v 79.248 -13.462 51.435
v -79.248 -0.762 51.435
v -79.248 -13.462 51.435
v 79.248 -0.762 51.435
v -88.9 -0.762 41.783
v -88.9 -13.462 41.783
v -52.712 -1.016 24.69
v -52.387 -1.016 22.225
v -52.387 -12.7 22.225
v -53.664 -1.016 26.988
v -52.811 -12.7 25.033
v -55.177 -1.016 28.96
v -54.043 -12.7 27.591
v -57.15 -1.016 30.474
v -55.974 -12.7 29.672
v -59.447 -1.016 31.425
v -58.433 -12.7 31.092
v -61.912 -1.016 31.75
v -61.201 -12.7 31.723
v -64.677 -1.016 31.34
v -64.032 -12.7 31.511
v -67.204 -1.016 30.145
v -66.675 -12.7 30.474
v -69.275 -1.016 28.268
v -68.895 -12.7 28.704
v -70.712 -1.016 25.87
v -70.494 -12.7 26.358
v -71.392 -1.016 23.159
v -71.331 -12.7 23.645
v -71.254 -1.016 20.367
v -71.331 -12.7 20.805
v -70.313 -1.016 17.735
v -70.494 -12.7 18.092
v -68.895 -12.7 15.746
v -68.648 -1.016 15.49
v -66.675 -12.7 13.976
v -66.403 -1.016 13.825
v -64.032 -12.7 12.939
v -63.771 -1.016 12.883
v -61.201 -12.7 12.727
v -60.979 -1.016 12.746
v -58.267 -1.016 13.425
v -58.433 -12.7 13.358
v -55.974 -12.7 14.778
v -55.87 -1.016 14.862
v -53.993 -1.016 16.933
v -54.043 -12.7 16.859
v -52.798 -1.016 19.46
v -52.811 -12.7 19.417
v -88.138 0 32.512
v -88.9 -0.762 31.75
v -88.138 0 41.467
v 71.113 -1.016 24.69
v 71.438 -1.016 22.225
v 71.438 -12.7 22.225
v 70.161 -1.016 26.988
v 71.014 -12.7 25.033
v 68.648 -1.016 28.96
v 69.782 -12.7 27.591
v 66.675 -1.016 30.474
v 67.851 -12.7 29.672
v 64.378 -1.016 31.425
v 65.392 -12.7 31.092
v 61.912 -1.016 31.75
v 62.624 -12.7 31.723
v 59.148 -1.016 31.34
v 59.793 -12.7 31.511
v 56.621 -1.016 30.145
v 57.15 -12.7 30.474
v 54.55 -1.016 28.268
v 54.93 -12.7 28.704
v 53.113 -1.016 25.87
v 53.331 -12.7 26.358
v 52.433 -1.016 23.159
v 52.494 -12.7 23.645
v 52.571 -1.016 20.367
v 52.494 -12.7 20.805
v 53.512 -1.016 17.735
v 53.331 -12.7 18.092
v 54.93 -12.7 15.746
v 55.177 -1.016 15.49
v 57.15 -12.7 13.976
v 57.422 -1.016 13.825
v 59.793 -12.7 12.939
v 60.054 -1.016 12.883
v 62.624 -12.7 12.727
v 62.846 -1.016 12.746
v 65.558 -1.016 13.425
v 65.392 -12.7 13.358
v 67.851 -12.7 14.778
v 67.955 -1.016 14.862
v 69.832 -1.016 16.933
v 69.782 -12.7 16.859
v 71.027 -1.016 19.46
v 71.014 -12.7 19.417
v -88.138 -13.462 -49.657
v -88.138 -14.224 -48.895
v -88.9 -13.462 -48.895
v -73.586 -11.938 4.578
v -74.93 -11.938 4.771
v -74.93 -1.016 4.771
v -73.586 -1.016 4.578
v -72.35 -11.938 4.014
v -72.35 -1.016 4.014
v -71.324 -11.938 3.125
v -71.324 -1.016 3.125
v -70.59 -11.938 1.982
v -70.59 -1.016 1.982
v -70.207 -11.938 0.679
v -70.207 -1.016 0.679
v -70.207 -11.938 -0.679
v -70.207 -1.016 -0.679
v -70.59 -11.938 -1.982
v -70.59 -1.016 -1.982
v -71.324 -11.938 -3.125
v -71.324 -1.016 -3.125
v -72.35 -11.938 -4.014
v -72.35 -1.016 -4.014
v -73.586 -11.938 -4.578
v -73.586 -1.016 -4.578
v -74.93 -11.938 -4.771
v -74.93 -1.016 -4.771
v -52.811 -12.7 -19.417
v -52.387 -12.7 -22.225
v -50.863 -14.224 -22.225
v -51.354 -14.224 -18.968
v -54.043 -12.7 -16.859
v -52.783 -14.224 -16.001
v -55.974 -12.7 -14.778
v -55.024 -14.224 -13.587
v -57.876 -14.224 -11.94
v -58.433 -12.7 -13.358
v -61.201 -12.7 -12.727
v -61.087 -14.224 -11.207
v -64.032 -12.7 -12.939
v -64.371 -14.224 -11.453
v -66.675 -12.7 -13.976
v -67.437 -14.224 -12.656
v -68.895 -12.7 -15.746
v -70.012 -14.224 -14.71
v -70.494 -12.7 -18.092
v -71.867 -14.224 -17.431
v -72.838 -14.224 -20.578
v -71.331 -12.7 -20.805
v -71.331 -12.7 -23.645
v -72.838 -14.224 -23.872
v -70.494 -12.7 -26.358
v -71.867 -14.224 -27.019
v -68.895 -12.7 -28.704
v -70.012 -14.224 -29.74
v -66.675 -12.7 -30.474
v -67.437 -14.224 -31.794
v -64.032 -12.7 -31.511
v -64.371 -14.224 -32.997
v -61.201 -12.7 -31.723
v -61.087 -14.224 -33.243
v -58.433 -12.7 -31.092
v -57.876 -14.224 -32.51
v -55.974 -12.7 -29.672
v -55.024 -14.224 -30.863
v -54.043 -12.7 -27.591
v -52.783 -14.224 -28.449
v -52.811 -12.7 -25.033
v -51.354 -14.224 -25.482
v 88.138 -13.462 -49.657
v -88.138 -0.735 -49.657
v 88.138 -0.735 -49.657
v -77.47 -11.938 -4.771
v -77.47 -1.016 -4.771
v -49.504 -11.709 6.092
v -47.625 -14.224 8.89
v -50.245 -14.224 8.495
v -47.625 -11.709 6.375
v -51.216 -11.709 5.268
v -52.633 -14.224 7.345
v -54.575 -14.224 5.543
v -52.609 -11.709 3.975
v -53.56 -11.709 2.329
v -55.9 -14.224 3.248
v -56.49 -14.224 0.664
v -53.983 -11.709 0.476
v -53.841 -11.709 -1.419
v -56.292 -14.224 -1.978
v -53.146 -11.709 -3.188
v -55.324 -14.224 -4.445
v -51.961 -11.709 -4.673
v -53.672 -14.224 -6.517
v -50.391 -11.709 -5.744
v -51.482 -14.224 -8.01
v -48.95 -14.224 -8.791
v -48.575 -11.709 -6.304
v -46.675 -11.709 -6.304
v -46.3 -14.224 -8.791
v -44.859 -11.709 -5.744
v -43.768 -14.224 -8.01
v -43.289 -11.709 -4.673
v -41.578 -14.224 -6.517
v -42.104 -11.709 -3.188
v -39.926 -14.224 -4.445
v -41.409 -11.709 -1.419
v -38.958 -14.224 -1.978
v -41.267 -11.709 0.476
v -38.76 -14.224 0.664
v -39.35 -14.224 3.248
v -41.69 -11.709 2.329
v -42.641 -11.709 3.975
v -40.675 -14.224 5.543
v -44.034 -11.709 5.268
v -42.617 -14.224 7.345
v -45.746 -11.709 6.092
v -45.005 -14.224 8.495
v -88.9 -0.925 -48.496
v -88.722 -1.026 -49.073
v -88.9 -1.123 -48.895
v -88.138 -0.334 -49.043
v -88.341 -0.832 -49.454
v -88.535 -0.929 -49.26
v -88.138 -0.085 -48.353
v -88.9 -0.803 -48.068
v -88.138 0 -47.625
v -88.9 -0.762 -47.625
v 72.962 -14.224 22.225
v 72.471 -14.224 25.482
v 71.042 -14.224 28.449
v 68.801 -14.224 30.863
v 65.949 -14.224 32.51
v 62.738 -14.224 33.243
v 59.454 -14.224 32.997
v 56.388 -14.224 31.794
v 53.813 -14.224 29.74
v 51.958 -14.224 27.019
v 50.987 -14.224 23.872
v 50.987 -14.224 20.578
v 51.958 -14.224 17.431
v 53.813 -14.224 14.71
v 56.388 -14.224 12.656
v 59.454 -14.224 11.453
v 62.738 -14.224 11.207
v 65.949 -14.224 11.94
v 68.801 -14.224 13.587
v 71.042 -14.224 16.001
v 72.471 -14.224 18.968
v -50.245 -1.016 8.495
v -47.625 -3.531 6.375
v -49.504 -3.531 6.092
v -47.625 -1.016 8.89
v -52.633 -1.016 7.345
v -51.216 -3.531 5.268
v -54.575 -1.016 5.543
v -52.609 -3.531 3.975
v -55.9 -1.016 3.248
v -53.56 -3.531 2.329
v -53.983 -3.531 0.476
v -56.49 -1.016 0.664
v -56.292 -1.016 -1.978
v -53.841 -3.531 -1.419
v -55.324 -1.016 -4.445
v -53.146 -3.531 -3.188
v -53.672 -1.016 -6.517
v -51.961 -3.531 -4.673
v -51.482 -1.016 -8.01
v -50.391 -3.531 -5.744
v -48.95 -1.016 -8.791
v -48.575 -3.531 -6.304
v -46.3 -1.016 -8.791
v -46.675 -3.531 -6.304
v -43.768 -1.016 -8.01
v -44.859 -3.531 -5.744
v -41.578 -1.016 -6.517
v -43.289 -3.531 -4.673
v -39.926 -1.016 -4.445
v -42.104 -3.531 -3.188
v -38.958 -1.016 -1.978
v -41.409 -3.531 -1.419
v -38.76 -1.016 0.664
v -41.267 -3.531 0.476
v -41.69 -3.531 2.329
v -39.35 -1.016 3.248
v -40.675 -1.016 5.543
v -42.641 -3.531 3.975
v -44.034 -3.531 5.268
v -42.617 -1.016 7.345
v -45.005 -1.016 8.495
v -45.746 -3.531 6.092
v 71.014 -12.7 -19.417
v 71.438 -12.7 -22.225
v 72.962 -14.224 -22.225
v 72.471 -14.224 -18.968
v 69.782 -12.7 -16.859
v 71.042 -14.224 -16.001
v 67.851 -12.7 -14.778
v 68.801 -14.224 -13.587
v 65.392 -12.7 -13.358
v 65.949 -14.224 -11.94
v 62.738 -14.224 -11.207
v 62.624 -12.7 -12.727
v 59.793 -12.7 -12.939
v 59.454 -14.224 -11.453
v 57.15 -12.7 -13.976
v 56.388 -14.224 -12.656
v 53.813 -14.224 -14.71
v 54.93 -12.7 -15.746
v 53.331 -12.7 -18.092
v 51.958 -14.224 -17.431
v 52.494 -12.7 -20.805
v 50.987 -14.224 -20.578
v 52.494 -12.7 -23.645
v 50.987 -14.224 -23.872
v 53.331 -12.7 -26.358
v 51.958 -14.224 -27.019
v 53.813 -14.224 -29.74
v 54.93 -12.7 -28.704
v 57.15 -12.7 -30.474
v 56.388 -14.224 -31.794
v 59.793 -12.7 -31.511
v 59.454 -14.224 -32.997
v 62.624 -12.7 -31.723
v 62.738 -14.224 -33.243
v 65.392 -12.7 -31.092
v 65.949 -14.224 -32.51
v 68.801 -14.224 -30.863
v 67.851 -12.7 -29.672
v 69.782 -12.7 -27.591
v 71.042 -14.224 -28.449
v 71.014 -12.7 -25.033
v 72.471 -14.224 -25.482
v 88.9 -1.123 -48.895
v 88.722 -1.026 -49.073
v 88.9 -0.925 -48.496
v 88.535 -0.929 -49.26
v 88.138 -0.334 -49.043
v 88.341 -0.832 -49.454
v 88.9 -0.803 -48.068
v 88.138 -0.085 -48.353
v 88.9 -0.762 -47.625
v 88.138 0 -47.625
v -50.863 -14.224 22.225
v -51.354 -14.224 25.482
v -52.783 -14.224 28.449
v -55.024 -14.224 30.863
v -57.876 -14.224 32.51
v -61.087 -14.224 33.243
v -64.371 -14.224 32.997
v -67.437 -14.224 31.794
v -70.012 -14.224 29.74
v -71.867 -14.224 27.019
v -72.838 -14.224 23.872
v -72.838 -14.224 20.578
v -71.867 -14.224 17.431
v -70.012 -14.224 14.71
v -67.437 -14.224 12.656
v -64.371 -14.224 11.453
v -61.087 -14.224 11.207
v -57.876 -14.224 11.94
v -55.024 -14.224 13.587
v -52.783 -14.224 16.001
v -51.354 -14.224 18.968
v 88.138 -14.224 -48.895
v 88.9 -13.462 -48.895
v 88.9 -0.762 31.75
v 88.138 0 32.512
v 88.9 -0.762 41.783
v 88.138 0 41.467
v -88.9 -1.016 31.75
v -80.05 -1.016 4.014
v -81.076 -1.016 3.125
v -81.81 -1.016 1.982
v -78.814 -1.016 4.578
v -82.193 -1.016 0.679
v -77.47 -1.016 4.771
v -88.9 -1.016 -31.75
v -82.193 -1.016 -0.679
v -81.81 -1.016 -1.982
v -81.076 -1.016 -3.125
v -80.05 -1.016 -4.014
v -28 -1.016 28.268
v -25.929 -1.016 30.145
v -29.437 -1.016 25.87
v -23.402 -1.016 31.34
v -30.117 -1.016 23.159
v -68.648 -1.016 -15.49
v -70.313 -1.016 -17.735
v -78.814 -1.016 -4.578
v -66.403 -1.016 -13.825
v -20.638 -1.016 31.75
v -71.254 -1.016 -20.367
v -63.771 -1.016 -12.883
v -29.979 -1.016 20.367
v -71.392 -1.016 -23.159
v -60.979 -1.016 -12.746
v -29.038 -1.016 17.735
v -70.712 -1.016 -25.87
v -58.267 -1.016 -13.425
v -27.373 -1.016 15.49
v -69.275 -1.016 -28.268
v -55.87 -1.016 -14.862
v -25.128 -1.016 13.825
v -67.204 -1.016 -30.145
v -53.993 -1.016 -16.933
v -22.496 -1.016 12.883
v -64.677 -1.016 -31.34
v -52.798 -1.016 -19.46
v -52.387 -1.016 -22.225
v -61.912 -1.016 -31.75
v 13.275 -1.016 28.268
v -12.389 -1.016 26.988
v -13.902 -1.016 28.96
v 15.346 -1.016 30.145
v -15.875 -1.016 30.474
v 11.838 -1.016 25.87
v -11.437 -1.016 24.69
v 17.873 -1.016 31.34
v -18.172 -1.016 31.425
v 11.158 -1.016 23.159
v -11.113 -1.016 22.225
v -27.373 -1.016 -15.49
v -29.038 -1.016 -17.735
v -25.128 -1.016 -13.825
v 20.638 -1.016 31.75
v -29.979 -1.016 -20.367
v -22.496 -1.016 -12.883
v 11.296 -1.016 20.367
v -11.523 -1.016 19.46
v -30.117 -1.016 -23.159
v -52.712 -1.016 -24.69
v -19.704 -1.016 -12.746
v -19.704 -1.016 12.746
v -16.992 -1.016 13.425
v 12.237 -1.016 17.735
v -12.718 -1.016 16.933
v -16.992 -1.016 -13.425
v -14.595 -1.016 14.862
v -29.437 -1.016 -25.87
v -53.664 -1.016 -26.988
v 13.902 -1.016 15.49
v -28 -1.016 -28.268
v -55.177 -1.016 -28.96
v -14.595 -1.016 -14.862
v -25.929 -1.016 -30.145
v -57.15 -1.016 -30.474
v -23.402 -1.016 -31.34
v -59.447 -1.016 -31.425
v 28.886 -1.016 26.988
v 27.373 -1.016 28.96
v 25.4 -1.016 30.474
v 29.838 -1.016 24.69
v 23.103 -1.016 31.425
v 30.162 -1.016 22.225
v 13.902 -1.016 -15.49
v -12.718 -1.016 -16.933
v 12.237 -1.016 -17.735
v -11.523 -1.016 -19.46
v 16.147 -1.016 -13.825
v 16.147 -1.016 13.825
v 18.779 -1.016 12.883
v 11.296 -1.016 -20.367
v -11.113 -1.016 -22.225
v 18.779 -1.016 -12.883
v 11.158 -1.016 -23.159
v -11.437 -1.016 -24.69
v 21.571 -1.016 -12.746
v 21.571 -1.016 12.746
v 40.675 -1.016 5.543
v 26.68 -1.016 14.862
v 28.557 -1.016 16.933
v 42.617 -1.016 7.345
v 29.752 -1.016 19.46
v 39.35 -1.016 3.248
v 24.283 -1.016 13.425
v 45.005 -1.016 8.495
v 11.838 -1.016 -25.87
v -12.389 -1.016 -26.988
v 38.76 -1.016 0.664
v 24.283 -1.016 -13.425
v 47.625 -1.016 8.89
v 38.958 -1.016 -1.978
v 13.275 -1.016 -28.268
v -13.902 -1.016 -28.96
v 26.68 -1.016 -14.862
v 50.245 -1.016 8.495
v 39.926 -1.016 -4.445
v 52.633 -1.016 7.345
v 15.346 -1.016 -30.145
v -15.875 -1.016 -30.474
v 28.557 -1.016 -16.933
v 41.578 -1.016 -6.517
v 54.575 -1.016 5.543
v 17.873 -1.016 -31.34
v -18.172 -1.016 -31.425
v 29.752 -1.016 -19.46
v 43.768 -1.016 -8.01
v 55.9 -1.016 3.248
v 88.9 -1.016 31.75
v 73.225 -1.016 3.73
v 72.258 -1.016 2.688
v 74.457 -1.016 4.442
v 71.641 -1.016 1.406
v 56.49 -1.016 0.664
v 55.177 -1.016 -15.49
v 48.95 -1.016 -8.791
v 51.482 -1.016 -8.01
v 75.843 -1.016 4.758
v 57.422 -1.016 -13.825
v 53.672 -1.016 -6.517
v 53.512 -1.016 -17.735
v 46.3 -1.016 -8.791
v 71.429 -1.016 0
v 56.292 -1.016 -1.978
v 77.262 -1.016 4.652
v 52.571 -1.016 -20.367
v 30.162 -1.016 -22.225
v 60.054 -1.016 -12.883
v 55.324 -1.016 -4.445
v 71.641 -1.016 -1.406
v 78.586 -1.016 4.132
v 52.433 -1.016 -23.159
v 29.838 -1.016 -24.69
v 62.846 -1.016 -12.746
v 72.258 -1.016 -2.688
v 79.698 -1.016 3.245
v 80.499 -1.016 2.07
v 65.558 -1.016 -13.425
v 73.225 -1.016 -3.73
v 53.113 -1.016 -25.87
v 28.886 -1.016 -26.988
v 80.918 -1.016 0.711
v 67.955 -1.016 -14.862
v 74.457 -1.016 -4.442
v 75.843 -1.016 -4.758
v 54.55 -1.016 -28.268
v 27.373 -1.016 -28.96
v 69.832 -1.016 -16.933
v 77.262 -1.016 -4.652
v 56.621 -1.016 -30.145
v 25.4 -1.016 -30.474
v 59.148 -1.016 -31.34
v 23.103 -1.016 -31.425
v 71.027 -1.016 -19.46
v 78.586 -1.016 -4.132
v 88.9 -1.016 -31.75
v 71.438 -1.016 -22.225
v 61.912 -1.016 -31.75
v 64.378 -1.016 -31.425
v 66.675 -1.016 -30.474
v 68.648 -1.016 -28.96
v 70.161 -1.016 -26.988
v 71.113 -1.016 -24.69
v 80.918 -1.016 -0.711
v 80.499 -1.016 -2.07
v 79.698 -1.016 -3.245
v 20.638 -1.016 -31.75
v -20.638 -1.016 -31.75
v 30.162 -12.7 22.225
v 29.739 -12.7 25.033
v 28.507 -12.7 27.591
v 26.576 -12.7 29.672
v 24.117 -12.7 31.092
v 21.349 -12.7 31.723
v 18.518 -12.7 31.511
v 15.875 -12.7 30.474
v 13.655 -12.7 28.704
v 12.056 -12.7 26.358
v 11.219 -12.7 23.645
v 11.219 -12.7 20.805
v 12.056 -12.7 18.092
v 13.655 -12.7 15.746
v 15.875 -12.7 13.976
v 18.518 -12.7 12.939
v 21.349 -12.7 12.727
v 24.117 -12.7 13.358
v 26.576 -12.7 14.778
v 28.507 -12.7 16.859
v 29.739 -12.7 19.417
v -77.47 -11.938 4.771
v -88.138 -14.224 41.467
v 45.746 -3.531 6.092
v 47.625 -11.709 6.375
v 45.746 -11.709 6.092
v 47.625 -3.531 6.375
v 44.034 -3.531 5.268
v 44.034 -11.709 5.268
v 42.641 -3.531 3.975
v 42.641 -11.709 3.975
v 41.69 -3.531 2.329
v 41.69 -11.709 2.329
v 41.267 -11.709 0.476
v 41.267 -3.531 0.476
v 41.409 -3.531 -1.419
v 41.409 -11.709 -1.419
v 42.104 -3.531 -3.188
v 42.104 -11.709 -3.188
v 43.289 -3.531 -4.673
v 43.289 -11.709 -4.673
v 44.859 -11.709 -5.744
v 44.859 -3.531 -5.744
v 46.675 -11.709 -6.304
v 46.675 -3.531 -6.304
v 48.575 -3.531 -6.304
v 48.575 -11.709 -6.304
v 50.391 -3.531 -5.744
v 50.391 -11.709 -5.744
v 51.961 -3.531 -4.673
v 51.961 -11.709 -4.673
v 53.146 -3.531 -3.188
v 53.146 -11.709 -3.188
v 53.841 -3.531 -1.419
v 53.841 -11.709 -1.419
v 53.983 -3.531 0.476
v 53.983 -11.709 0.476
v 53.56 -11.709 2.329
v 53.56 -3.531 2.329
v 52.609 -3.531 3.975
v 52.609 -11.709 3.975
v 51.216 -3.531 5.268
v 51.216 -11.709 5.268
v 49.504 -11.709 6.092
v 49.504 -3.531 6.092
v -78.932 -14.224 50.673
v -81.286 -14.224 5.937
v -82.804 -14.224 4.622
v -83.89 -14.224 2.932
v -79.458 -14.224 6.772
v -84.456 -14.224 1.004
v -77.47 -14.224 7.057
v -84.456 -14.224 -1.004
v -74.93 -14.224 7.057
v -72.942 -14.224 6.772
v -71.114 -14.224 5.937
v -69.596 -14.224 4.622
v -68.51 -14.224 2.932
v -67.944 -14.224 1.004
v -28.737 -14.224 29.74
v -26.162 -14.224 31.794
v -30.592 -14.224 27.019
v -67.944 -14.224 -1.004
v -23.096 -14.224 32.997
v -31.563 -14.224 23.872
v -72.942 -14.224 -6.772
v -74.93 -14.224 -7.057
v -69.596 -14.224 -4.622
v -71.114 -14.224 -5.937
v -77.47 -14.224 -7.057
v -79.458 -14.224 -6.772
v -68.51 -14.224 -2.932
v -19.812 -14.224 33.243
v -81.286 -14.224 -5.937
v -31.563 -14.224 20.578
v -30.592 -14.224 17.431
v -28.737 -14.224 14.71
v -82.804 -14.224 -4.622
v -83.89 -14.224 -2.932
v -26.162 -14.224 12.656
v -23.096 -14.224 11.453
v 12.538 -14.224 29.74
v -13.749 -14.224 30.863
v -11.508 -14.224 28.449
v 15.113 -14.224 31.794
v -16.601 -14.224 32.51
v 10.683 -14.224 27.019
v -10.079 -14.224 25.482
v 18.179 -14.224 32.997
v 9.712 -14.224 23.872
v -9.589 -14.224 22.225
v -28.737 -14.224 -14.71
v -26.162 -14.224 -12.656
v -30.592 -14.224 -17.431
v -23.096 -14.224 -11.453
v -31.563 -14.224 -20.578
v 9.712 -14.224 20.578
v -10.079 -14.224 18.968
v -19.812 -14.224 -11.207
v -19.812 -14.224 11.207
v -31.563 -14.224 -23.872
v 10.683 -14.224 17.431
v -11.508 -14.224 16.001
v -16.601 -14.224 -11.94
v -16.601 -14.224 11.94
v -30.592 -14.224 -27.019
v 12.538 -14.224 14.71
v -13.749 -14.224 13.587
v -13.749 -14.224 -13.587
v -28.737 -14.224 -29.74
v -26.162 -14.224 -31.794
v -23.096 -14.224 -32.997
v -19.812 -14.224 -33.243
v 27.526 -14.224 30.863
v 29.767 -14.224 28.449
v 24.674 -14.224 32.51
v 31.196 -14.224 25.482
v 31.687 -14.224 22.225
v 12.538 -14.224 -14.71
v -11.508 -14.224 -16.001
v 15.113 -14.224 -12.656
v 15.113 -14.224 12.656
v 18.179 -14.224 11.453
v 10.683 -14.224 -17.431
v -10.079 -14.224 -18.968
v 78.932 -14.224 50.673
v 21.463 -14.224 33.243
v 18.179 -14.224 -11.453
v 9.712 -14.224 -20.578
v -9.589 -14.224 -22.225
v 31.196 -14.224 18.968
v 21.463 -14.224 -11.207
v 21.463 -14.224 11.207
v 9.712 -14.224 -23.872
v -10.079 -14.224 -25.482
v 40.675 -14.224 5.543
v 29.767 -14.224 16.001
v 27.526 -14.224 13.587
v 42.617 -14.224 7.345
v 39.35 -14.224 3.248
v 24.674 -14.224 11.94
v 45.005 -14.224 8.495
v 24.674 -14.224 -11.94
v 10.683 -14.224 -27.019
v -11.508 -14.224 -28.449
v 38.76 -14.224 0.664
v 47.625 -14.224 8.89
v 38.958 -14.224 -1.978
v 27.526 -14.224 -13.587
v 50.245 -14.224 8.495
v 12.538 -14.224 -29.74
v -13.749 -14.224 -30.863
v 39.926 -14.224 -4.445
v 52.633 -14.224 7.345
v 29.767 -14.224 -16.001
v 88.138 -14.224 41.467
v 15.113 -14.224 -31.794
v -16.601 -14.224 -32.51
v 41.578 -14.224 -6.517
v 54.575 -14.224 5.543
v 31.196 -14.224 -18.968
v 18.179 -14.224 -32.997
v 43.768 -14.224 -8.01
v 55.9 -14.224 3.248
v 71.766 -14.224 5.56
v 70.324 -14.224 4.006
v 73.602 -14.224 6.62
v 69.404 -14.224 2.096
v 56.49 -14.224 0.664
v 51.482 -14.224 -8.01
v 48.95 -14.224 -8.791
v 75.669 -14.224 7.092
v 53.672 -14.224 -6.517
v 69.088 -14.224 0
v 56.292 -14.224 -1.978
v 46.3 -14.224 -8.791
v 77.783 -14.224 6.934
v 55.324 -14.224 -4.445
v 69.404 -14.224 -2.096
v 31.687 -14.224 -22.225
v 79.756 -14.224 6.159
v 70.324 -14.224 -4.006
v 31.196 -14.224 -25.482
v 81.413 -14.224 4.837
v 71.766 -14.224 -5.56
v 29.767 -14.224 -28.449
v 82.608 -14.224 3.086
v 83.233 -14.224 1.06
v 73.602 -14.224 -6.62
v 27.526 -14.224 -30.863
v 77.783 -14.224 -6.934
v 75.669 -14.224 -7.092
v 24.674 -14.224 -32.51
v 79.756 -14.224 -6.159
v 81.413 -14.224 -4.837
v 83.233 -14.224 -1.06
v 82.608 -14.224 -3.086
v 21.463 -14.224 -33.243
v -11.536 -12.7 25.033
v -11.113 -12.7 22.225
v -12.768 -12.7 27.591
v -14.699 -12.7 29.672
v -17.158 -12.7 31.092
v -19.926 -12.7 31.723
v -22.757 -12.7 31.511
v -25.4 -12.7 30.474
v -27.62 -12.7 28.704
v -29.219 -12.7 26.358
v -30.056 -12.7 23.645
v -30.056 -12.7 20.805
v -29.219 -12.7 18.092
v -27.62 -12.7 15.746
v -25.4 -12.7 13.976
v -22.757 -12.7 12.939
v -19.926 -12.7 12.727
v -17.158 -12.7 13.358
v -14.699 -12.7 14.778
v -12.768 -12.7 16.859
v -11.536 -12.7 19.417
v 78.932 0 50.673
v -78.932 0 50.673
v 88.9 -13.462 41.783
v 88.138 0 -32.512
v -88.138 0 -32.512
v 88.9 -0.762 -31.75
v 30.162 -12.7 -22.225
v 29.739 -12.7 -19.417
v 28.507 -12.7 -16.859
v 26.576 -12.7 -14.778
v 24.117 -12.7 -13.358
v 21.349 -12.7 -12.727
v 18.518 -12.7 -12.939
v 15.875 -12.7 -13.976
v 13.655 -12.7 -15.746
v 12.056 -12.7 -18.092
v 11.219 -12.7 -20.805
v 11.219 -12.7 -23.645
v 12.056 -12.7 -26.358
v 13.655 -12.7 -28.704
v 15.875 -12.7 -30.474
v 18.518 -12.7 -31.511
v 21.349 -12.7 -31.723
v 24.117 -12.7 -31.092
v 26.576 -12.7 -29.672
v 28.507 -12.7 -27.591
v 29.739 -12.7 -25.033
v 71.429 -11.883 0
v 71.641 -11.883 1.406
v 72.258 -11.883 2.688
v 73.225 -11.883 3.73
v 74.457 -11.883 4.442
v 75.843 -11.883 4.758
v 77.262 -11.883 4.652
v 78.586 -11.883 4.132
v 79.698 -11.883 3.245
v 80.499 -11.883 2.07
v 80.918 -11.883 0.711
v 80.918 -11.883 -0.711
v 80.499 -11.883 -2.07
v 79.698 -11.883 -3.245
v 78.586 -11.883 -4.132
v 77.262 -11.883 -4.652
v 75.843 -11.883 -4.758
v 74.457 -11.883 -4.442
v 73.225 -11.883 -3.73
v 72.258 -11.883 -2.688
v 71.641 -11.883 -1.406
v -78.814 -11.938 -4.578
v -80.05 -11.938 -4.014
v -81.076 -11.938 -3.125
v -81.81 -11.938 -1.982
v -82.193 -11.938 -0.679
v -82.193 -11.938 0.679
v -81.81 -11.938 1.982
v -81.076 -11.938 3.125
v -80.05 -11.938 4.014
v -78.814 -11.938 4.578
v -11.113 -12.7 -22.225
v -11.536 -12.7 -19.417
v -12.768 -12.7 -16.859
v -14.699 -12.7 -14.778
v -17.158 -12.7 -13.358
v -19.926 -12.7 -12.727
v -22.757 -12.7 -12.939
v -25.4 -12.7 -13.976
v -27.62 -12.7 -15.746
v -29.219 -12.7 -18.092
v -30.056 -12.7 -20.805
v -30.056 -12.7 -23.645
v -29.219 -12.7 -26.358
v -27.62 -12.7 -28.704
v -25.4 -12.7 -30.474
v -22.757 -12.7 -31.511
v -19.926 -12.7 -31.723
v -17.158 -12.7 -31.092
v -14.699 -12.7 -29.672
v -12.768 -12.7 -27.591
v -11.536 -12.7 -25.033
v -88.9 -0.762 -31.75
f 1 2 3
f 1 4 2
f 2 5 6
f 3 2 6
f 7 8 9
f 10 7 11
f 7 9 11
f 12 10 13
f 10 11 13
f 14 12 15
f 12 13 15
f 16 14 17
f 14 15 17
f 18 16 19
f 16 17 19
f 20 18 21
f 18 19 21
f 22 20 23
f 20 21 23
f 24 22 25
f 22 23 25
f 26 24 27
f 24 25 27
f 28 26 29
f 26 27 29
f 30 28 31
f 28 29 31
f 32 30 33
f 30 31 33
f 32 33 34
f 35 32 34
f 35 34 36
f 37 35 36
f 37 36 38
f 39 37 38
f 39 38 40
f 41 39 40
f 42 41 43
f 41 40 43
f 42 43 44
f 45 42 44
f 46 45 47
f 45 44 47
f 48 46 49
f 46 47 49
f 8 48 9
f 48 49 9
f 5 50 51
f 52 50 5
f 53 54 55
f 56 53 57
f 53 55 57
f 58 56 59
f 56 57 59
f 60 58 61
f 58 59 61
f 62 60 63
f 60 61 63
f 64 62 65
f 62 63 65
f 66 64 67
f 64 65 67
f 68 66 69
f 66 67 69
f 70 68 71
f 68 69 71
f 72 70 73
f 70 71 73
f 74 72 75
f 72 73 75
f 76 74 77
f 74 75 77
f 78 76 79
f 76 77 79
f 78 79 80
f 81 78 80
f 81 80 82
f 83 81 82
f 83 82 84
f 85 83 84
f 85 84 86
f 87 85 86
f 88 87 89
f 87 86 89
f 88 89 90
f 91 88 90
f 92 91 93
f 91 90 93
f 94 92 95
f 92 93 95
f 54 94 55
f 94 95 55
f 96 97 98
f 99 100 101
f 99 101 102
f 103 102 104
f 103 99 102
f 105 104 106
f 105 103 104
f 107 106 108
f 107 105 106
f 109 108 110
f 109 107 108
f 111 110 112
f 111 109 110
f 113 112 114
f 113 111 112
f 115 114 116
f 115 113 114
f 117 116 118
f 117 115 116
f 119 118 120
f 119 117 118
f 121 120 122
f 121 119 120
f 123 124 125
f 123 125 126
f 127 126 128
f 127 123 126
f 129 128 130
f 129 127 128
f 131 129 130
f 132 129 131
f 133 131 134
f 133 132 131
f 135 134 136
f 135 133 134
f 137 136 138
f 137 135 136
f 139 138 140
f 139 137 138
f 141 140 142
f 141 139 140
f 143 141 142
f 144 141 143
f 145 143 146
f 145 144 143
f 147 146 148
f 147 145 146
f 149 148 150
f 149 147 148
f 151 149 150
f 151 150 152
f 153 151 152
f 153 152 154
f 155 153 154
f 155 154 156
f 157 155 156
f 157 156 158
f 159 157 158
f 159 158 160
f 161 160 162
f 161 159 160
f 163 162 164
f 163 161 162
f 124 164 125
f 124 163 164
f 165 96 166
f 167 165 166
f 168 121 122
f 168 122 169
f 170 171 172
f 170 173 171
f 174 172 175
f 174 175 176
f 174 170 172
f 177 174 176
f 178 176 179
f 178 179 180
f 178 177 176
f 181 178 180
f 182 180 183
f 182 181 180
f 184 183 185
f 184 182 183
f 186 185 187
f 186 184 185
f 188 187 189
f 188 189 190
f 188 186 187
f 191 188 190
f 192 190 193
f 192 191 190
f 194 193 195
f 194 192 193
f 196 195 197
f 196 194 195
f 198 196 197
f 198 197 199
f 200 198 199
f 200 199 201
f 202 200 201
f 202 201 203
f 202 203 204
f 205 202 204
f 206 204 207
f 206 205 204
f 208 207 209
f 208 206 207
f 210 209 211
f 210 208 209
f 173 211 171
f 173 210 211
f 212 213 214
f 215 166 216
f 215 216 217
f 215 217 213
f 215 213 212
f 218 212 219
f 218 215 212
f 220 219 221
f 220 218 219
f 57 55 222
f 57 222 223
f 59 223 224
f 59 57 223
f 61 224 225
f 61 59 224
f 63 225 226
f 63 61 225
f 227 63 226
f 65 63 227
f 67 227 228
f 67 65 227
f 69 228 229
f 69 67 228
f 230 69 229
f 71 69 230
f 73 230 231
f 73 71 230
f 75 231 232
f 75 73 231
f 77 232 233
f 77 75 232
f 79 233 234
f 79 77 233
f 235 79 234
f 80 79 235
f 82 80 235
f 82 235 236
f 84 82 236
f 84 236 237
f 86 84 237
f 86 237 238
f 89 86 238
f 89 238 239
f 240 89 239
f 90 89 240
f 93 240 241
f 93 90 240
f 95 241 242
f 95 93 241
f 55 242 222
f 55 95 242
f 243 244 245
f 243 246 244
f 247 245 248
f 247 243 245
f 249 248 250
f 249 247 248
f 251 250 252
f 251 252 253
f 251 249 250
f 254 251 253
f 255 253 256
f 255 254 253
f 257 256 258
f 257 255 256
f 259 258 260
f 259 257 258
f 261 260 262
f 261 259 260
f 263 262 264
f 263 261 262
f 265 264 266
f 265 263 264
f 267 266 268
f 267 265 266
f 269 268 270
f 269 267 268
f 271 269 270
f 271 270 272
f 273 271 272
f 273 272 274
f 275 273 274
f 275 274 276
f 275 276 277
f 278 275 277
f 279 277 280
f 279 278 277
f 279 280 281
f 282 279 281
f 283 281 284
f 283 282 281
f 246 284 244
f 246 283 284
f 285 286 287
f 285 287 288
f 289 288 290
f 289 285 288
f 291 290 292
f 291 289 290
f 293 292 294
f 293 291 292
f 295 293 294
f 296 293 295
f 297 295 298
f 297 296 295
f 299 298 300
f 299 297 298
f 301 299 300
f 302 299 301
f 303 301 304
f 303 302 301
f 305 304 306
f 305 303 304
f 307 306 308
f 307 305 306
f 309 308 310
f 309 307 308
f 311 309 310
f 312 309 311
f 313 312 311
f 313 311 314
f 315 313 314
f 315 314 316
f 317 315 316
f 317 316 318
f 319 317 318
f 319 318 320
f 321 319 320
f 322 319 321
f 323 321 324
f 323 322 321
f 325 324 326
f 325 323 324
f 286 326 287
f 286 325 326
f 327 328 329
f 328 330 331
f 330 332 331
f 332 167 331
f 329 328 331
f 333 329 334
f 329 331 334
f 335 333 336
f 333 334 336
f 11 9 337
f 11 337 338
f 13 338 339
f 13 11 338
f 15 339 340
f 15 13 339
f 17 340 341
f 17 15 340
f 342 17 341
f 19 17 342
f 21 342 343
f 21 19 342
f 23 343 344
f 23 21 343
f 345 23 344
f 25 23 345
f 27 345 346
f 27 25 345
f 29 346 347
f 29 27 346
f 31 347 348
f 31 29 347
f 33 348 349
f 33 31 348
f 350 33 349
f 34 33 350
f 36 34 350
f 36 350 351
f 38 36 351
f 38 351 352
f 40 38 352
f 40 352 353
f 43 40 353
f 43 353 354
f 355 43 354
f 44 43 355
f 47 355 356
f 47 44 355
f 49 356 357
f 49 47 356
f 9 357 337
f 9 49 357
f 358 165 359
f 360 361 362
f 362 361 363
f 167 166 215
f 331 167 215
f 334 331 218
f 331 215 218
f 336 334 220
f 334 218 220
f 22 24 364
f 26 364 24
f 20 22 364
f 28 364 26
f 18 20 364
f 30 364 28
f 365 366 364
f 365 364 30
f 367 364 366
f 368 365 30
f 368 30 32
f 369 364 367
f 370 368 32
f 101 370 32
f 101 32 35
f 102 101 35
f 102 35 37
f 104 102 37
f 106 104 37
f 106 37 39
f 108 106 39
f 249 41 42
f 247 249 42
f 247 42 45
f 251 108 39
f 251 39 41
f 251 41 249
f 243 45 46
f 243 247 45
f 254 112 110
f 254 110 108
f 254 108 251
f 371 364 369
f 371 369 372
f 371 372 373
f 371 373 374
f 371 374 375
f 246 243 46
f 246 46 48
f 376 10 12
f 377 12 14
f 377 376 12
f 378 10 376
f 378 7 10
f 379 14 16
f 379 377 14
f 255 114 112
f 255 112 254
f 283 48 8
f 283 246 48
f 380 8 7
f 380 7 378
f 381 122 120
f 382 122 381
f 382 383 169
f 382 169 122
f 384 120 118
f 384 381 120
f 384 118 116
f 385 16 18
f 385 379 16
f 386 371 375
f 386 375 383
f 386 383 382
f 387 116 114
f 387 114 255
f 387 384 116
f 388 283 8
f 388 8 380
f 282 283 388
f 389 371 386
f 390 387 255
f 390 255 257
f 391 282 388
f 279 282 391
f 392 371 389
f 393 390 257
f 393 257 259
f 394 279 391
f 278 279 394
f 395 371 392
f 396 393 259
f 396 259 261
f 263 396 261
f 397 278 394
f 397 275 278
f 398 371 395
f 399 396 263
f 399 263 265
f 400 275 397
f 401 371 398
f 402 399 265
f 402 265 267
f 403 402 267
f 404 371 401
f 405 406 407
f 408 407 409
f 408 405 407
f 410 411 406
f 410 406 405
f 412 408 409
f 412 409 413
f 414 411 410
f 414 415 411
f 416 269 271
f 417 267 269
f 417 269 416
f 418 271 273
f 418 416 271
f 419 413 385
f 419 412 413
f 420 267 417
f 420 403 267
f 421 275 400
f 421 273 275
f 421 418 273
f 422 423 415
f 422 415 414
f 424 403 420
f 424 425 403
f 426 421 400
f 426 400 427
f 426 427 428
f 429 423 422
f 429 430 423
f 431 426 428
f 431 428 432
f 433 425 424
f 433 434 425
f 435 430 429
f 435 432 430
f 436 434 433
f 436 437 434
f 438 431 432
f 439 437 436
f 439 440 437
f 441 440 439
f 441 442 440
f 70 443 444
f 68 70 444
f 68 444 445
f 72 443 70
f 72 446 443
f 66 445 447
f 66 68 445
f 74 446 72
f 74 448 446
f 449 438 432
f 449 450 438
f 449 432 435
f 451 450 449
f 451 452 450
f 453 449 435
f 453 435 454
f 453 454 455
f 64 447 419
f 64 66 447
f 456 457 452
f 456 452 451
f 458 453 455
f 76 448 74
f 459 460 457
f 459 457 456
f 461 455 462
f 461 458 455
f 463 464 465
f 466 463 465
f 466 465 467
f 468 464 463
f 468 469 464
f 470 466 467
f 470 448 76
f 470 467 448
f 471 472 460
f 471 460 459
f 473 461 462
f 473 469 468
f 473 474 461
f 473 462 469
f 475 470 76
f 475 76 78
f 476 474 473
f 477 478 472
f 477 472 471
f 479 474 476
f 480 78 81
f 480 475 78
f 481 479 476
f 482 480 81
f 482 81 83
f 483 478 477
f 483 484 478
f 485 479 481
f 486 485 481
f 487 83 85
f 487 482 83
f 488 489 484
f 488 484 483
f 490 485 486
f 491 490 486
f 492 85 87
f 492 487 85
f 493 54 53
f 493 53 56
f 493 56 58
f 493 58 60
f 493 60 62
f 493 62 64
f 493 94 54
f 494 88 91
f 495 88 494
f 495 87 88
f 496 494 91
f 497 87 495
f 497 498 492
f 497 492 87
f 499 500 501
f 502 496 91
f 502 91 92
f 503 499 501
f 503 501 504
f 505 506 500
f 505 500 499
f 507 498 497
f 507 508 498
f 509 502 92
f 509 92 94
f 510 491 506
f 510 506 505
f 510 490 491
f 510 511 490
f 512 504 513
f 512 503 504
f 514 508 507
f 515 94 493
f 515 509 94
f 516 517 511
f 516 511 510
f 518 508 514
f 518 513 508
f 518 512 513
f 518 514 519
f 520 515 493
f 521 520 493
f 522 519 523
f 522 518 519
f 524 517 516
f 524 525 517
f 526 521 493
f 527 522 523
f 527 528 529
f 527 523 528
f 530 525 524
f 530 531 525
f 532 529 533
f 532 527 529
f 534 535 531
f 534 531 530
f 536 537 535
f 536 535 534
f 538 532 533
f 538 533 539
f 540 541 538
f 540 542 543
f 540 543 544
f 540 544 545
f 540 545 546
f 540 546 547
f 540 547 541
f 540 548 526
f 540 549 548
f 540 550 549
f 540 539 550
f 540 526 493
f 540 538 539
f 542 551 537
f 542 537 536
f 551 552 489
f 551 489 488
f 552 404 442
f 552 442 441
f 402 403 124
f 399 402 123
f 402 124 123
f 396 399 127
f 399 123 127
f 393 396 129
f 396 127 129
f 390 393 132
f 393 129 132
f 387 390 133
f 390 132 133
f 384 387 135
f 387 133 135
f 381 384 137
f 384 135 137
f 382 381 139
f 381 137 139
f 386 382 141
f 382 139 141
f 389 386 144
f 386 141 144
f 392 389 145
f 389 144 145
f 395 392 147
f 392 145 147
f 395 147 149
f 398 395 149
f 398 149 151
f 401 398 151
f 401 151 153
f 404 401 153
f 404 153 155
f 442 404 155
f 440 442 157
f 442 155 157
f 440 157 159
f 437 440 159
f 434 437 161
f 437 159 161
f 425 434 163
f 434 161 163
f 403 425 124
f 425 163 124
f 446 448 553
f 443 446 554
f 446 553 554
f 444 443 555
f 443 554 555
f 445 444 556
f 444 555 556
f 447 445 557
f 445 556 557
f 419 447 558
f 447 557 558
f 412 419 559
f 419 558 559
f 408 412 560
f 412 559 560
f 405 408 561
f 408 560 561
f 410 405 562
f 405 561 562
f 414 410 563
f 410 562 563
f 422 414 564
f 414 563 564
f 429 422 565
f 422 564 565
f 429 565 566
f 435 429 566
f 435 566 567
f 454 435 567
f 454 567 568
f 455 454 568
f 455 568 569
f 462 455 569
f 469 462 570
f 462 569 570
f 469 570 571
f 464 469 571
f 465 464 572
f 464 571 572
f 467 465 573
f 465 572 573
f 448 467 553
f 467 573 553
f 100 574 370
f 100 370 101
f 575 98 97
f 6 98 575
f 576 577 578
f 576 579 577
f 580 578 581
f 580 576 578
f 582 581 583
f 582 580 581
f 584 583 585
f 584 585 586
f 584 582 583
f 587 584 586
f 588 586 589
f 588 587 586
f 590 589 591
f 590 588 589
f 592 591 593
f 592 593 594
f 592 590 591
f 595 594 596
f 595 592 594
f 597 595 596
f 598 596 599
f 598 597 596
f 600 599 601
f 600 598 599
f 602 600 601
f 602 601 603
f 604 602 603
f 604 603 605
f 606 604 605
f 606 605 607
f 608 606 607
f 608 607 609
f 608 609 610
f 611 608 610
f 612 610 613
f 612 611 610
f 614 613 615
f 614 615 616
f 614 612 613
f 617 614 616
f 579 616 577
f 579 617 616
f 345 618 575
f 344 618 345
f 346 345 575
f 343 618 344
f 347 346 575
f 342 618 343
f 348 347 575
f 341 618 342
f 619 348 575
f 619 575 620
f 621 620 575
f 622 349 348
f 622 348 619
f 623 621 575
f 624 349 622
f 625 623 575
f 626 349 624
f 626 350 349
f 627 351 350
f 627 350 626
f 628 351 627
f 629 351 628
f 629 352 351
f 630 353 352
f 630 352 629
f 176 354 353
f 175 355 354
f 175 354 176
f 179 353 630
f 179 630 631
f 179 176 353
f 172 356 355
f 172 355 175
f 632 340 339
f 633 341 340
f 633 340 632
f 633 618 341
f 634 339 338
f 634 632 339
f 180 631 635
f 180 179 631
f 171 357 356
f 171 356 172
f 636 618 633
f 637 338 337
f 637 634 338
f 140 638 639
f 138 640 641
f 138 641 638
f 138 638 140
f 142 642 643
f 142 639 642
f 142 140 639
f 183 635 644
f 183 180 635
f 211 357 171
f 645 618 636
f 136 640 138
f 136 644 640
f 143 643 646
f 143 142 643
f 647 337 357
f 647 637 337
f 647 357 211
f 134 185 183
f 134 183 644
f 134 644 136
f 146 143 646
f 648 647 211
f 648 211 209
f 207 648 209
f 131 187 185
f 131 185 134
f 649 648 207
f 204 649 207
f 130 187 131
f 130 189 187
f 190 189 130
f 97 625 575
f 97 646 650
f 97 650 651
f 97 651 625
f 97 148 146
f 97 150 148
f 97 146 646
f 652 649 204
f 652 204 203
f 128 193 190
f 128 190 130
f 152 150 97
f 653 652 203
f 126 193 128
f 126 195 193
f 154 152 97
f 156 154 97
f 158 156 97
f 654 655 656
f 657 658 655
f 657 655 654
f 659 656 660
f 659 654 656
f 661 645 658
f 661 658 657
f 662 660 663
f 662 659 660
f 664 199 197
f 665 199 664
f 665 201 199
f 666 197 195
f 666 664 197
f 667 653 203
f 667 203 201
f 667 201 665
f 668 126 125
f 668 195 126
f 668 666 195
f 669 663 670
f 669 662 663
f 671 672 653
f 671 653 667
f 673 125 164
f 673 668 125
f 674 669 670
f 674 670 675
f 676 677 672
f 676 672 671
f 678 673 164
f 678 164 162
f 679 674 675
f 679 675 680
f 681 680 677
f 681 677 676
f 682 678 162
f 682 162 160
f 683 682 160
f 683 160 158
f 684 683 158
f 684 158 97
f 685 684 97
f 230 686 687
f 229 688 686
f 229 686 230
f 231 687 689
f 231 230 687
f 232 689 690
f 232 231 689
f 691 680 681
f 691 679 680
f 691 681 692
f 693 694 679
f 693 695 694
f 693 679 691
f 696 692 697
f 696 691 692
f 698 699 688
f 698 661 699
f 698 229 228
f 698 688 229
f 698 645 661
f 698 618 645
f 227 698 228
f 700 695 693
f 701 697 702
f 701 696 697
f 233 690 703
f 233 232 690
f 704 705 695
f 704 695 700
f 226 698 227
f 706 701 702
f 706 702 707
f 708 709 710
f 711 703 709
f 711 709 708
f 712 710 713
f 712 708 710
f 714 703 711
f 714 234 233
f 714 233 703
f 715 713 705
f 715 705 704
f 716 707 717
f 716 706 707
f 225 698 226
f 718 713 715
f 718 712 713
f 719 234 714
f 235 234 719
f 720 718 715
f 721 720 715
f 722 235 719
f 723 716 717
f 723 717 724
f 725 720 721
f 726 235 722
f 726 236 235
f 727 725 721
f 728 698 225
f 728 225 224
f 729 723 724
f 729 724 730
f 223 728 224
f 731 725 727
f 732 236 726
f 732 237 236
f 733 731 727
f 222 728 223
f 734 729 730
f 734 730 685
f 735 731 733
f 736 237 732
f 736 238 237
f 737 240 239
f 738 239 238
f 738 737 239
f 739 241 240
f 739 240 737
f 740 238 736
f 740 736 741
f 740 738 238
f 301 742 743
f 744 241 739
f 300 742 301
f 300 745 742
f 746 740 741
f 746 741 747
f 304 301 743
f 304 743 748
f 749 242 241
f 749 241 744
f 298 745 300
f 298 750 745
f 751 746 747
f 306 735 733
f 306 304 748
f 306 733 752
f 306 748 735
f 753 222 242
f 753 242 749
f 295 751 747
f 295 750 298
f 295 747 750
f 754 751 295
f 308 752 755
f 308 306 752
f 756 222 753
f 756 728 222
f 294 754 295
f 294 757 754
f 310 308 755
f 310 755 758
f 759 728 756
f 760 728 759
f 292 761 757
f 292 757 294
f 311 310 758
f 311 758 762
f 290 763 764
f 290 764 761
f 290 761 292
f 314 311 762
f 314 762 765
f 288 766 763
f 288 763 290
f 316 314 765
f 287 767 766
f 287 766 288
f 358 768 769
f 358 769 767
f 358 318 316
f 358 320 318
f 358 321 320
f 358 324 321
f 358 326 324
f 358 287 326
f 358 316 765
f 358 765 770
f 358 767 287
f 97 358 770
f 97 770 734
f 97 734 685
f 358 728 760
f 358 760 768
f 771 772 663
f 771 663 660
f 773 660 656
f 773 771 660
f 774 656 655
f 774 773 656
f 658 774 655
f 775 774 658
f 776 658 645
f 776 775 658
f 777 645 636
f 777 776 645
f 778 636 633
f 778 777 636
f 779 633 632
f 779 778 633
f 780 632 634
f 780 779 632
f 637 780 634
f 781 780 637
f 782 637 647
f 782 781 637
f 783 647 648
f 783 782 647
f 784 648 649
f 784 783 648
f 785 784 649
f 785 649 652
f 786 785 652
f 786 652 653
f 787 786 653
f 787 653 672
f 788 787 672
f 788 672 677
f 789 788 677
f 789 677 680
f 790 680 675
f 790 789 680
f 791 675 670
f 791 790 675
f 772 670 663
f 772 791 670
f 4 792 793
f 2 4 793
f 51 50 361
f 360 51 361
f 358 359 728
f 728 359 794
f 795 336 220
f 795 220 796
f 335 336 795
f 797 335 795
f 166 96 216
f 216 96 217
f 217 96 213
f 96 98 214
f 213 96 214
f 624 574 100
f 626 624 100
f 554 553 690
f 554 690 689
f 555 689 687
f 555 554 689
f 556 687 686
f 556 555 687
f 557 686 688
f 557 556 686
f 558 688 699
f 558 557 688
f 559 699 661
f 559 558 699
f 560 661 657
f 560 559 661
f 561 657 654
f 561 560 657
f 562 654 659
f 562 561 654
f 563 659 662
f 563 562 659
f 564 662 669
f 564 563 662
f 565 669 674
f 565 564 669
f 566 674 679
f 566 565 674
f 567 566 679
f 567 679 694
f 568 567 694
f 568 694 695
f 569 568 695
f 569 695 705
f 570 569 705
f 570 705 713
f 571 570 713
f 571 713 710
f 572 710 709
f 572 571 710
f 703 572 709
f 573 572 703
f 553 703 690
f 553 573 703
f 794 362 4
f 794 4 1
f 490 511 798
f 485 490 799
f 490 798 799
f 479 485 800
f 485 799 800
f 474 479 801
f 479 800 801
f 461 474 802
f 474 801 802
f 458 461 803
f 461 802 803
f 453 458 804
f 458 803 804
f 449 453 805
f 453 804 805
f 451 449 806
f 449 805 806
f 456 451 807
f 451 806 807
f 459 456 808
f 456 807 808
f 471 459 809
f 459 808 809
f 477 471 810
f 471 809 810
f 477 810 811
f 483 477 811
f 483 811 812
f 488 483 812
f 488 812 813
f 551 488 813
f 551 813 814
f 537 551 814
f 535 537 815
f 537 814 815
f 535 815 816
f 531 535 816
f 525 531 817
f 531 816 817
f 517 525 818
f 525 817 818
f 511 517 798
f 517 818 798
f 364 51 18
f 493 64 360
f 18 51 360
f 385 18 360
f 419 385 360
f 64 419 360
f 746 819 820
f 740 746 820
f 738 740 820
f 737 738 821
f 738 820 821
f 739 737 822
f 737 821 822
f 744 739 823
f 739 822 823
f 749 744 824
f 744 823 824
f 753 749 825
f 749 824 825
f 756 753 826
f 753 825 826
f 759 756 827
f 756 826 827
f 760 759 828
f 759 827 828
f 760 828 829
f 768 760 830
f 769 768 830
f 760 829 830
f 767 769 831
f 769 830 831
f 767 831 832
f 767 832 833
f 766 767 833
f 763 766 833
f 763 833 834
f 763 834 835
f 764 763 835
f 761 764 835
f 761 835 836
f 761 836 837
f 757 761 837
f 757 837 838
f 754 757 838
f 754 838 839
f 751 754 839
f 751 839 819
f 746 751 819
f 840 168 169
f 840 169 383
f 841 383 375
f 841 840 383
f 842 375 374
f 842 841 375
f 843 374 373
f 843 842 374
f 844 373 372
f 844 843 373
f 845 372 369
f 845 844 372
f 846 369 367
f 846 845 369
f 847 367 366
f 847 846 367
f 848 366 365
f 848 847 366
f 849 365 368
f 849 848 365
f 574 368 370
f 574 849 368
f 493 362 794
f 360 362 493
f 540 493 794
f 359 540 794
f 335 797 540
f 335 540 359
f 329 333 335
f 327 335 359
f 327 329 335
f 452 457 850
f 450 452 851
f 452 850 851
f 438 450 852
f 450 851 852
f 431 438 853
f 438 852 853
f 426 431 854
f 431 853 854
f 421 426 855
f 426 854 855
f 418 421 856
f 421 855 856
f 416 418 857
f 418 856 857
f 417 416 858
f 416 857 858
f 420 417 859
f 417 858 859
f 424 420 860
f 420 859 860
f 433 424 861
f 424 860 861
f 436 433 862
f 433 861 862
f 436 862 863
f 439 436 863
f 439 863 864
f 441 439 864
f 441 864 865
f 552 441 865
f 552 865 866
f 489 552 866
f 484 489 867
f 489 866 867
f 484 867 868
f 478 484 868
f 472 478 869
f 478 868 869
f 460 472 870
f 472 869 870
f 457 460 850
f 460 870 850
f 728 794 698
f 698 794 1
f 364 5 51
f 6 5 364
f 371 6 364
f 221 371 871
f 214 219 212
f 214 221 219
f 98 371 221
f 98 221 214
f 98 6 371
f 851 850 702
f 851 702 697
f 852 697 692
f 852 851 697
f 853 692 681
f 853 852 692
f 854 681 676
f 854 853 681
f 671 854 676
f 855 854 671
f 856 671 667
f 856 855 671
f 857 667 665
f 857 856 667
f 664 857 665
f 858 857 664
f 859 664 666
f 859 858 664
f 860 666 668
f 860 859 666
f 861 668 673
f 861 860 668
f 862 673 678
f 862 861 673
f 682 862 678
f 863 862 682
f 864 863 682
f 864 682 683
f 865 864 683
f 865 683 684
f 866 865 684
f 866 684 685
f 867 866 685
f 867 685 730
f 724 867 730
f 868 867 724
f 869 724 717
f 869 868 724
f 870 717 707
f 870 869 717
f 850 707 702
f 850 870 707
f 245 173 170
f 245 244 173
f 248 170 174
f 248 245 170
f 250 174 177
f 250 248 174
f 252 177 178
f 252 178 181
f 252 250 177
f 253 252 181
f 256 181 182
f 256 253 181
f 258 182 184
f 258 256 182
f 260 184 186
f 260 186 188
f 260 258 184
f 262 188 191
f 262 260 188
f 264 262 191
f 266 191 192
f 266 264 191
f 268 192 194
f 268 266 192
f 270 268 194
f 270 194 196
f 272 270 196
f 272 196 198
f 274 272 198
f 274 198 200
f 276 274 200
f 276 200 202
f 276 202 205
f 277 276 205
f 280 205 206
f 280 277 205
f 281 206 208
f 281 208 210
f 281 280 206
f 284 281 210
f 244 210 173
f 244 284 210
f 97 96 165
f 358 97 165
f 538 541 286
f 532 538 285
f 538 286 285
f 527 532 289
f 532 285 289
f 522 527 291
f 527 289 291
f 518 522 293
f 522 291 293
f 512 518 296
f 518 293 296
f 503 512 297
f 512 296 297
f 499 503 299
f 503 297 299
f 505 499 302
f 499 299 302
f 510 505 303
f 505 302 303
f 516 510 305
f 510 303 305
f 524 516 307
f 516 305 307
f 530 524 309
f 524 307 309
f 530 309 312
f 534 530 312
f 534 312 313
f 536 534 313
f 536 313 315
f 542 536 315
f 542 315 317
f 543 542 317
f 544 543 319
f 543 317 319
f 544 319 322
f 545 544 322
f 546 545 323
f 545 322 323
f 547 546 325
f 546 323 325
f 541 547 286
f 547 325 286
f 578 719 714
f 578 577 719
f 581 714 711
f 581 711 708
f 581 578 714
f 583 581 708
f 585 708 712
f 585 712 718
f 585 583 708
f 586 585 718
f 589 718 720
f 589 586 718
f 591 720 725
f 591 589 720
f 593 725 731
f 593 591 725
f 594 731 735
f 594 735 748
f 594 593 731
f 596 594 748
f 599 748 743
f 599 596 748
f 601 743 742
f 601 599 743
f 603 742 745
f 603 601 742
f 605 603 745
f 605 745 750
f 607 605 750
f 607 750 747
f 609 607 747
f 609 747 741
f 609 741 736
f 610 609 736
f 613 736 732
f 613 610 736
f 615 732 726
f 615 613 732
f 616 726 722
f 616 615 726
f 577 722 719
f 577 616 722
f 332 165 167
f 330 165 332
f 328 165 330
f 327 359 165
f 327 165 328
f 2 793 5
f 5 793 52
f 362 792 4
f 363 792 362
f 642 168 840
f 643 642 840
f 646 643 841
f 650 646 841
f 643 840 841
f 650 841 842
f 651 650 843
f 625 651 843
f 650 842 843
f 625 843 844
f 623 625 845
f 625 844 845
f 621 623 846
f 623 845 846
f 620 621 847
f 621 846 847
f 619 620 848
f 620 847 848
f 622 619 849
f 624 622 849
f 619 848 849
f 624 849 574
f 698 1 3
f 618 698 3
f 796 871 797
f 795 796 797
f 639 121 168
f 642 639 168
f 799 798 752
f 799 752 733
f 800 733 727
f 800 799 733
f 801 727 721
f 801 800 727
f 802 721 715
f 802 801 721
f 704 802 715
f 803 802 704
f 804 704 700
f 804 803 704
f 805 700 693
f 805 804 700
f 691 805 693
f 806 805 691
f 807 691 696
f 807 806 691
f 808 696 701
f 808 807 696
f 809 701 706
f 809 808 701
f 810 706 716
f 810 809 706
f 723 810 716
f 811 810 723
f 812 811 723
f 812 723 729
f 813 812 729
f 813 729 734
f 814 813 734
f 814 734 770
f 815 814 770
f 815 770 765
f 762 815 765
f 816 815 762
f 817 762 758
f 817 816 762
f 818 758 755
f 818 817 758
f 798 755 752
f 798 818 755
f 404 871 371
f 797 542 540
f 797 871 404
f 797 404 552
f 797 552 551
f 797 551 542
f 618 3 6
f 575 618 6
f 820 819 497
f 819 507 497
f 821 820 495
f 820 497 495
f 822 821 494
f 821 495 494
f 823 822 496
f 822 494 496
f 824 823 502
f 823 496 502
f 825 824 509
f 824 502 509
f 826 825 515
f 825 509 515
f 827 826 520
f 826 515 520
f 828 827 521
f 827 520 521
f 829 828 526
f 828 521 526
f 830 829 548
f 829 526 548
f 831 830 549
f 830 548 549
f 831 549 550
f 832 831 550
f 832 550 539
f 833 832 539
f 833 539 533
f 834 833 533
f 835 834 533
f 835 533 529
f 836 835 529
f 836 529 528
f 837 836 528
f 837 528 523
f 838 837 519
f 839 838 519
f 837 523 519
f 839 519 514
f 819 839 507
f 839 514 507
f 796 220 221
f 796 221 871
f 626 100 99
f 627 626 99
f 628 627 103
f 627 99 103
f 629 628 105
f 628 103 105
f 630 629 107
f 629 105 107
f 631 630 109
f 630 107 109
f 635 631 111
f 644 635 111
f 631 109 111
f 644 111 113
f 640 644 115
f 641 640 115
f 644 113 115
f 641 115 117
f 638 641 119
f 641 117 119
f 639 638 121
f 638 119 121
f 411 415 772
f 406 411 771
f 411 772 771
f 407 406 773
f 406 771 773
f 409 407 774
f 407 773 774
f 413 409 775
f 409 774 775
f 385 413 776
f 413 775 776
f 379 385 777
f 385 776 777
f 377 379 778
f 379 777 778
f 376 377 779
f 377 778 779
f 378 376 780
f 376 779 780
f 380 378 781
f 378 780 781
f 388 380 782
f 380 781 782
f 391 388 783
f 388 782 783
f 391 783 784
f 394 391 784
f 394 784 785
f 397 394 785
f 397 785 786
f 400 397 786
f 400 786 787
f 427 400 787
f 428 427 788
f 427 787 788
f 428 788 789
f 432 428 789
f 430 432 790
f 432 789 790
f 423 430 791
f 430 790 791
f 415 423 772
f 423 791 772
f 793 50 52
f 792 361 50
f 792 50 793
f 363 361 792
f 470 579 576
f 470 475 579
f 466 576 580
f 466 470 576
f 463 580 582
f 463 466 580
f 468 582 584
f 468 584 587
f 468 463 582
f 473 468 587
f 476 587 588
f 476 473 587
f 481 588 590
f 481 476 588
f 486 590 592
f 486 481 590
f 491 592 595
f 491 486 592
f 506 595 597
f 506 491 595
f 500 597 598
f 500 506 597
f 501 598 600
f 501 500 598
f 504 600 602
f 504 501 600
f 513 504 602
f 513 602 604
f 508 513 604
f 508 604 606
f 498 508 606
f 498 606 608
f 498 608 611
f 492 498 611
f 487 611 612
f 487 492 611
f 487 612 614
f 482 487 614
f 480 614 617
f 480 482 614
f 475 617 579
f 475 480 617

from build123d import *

# Parameters (mm, degrees)
EXTRUDE1_DEPTH                         = 88.9
EXTRUDE5_REACH                         = 90.9
EXTRUDE5_DIRECTION_2_REACH             = 90.9
F_3_4_0_75_DIAMETER_HOLE1_D            = 19.05
F_3_4_0_75_DIAMETER_HOLE1_DEPTH        = 18.5166
SKETCH6_W                              = 177.8
SKETCH6_H                              = 63.5
EXTRUDE2_DEPTH                         = 1.016
CHAMFER10_SIZE                         = 9.652
SKETCH35_W                             = 101.092
SKETCH35_H                             = 4.2926
EXTRUDE11_DEPTH                        = 89.9
EXTRUDE11_DEPTH_BACK                   = 89.9
F_3_8_0_375_DIAMETER_HOLE1_D           = 9.54278
F_3_8_0_375_DIAMETER_HOLE1_CSINK_D     = 14.224
F_3_8_0_375_DIAMETER_HOLE1_CSINK_ANGLE = 90
EXTRUDE8_DEPTH                         = 15.224
CHAMFER13_SIZE                         = 2.286
F_1_2_0_5_DIAMETER_HOLE4_AT_2_COUNT    = 2
F_1_2_0_5_DIAMETER_HOLE4_AT_2_PITCH    = 95.25
CHAMFER16_SIZE                         = 0.762
CHAMFER19_SIZE                         = 1.524


with BuildPart() as part:
    # Sketch1 → Extrude1 (new body, symmetric)
    with BuildSketch(Plane(origin=(0, 0, 0), x_dir=(0, 0, -1), z_dir=(1, 0, 0))):
        Polygon((-47.625, 0), (-51.435, 0), (-51.435, -18.5166), (-47.625, -18.5166), (47.625, -18.5166), (47.625, 0), align=None)
    extrude(amount=EXTRUDE1_DEPTH, both=True)

    # Extrude5: up to this face of the body (flat: up to its plane)
    extrude5_end = Plane(part.part.faces().sort_by_distance((-88.9, -9.2583, 1.905))[0])
    # Sketch10 → Extrude5 (add, up to the picked face)
    with BuildSketch(Plane(origin=(0, 0, 0), x_dir=(0, 0, -1), z_dir=(1, 0, 0)), mode=Mode.PRIVATE) as extrude5_sk1:
        with BuildLine():
            Line((47.625, 0), (47.625, -18.5166))
            Line((47.625, -18.5166), (49.657, -18.5166))
            Line((49.657, -18.5166), (49.657, -0.735409666))
            ThreePointArc((49.657, -0.735409666), (48.705491945, -0.189508055), (47.625, 0))
        make_face()
    extrude5_tool1 = split(extrude(extrude5_sk1.sketch, amount=-EXTRUDE5_REACH, mode=Mode.PRIVATE), bisect_by=extrude5_end, keep=Keep.BOTH, mode=Mode.PRIVATE)
    add(extrude5_tool1.solids().sort_by(Axis((0, -9.373301, -48.63438), (-1, 0, 0)))[0])

    # Extrude5 direction 2: up to this face of the body (flat: up to its plane)
    extrude5_direction_2_end = Plane(part.part.faces().sort_by_distance((88.9, -9.2583, 1.905))[0])
    # Sketch10 → Extrude5 direction 2 (add, up to the picked face)
    with BuildSketch(Plane(origin=(0, 0, 0), x_dir=(0, 0, -1), z_dir=(1, 0, 0)), mode=Mode.PRIVATE) as extrude5_direction_2_sk1:
        with BuildLine():
            Line((47.625, 0), (47.625, -18.5166))
            Line((47.625, -18.5166), (49.657, -18.5166))
            Line((49.657, -18.5166), (49.657, -0.735409666))
            ThreePointArc((49.657, -0.735409666), (48.705491945, -0.189508055), (47.625, 0))
        make_face()
    extrude5_direction_2_tool1 = split(extrude(extrude5_direction_2_sk1.sketch, amount=EXTRUDE5_DIRECTION_2_REACH, mode=Mode.PRIVATE), bisect_by=extrude5_direction_2_end, keep=Keep.BOTH, mode=Mode.PRIVATE)
    add(extrude5_direction_2_tool1.solids().sort_by(Axis((0, -9.373301, -48.63438), (1, 0, 0)))[0])

    # 3/4 (0.75) Diameter Hole1
    with Locations(Plane(origin=(100.583096031, 0, 72.51255066), x_dir=(-1, 0, 0), z_dir=(0, 1, 0))):
        with Locations((162.495596031, -94.73755066), (121.220596031, -94.73755066), (79.945596031, -94.73755066), (38.670596031, -94.73755066), (79.945596031, -50.28755066), (121.220596031, -50.28755066), (162.495596031, -50.28755066), (38.670596031, -50.28755066)):
            Hole(F_3_4_0_75_DIAMETER_HOLE1_D / 2, depth=F_3_4_0_75_DIAMETER_HOLE1_DEPTH)

    # Sketch6 → Extrude2 (cut)
    with BuildSketch(Plane(origin=(0, 0, 0), x_dir=(1, 0, 0), z_dir=(0, 1, 0))):
        Rectangle(SKETCH6_W, SKETCH6_H)
    extrude(amount=-EXTRUDE2_DEPTH, mode=Mode.SUBTRACT)

    # Chamfer10
    chamfer10_edges = [part.edges().sort_by_distance(p)[0] for p in [
        (88.9, -9.2583, 51.435),
        (-88.9, -9.2583, 51.435),
    ]]
    chamfer(chamfer10_edges, length=CHAMFER10_SIZE)

    # Sketch35 → Extrude11 (cut, two sides)
    with BuildSketch(Plane(origin=(0, 0, 0), x_dir=(0, 0, -1), z_dir=(1, 0, 0))) as extrude11_sk:
        with Locations((-0.889, -16.3703)):
            Rectangle(SKETCH35_W, SKETCH35_H)
    extrude(amount=EXTRUDE11_DEPTH, mode=Mode.SUBTRACT)
    extrude(extrude11_sk.sketch, amount=-EXTRUDE11_DEPTH_BACK, mode=Mode.SUBTRACT)

    # 3/8 (0.375) Diameter Hole1 (through all)
    with Locations(Plane(origin=(11.630068396, -14.224, 20.686230534), x_dir=(1, 0, 0), z_dir=(0, -1, 0))):
        with Locations((64.569931604, -20.686230534)):
            CounterSinkHole(F_3_8_0_375_DIAMETER_HOLE1_D / 2, F_3_8_0_375_DIAMETER_HOLE1_CSINK_D / 2, counter_sink_angle=F_3_8_0_375_DIAMETER_HOLE1_CSINK_ANGLE)

    # Sketch19 → Extrude8 (cut, through all)
    with BuildSketch(Plane.XZ.offset(14.224)):
        with BuildLine():
            Line((-77.47, 4.77139), (-74.93, 4.77139))
            ThreePointArc((-74.93, 4.77139), (-70.15861, 0), (-74.93, -4.77139))
            Line((-74.93, -4.77139), (-77.47, -4.77139))
            ThreePointArc((-77.47, -4.77139), (-82.24139, 0), (-77.47, 4.77139))
        make_face()
    extrude(amount=-EXTRUDE8_DEPTH, mode=Mode.SUBTRACT)

    # Chamfer13
    chamfer13_edges = [part.edges().sort_by_distance(p)[0] for p in [
        (-82.24139, -14.224, 0),
        (-76.2, -14.224, -4.77139),
        (-70.15861, -14.224, 0),
        (-76.2, -14.224, 4.77139),
    ]]
    chamfer(chamfer13_edges, length=CHAMFER13_SIZE)

    # Sketch26 → 1/2 (0.5) Diameter Hole4 (revolve, cut)
    with BuildSketch(Plane(origin=(-47.625, -1.016, 0), x_dir=(0, 0, 1), z_dir=(1, 0, 0))):
        Polygon((0, 0), (0, 13.208), (8.89, 13.208), (6.3754, 10.6934), (6.3754, 2.5146), (8.89, 0), align=None)
    f_1_2_0_5_diameter_hole4 = revolve(axis=Axis((-47.625, 5.334, 0), (0, -1, 0)), mode=Mode.SUBTRACT)

    # 1/2 (0.5) Diameter Hole4 at 2: 1/2 (0.5) Diameter Hole4 ×2
    with Locations(*[(i * F_1_2_0_5_DIAMETER_HOLE4_AT_2_PITCH, 0, 0) for i in range(1, F_1_2_0_5_DIAMETER_HOLE4_AT_2_COUNT)]):
        add(f_1_2_0_5_diameter_hole4, mode=Mode.SUBTRACT)

    # Chamfer16
    chamfer16_edges = [part.edges().sort_by_distance(p)[0] for p in [
        (0, 0, 31.75),
        (0, 0, -31.75),
        (88.9, 0, -39.6875),
        (0, 0, 51.435),
        (-84.074, 0, 46.609),
        (84.074, 0, 46.609),
        (-84.074, -14.224, 46.609),
        (88.9, -7.479704833, -49.657),
        (-88.9, -14.224, -3.937),
        (0, -14.224, 51.435),
        (84.074, -14.224, 46.609),
        (0, -14.224, -49.657),
        (88.9, -14.224, -3.937),
        (-88.9, -7.479704833, -49.657),
        (-88.9, -0.189508055, -48.705491945),
        (88.9, -0.189508055, -48.705491945),
        (-88.9, 0, -39.6875),
        (-88.9, 0, 36.7665),
        (88.9, 0, 36.7665),
    ]]
    chamfer(chamfer16_edges, length=CHAMFER16_SIZE)

    # Chamfer19
    chamfer19_edges = [part.edges().sort_by_distance(p)[0] for p in [
        (-71.4375, -14.224, 22.225),
        (11.1125, -14.224, 22.225),
        (11.1125, -14.224, -22.225),
        (-71.4375, -14.224, -22.225),
        (-30.1625, -14.224, -22.225),
        (52.3875, -14.224, -22.225),
        (-30.1625, -14.224, 22.225),
        (52.3875, -14.224, 22.225),
    ]]
    chamfer(chamfer19_edges, length=CHAMFER19_SIZE)


solid = part.part
